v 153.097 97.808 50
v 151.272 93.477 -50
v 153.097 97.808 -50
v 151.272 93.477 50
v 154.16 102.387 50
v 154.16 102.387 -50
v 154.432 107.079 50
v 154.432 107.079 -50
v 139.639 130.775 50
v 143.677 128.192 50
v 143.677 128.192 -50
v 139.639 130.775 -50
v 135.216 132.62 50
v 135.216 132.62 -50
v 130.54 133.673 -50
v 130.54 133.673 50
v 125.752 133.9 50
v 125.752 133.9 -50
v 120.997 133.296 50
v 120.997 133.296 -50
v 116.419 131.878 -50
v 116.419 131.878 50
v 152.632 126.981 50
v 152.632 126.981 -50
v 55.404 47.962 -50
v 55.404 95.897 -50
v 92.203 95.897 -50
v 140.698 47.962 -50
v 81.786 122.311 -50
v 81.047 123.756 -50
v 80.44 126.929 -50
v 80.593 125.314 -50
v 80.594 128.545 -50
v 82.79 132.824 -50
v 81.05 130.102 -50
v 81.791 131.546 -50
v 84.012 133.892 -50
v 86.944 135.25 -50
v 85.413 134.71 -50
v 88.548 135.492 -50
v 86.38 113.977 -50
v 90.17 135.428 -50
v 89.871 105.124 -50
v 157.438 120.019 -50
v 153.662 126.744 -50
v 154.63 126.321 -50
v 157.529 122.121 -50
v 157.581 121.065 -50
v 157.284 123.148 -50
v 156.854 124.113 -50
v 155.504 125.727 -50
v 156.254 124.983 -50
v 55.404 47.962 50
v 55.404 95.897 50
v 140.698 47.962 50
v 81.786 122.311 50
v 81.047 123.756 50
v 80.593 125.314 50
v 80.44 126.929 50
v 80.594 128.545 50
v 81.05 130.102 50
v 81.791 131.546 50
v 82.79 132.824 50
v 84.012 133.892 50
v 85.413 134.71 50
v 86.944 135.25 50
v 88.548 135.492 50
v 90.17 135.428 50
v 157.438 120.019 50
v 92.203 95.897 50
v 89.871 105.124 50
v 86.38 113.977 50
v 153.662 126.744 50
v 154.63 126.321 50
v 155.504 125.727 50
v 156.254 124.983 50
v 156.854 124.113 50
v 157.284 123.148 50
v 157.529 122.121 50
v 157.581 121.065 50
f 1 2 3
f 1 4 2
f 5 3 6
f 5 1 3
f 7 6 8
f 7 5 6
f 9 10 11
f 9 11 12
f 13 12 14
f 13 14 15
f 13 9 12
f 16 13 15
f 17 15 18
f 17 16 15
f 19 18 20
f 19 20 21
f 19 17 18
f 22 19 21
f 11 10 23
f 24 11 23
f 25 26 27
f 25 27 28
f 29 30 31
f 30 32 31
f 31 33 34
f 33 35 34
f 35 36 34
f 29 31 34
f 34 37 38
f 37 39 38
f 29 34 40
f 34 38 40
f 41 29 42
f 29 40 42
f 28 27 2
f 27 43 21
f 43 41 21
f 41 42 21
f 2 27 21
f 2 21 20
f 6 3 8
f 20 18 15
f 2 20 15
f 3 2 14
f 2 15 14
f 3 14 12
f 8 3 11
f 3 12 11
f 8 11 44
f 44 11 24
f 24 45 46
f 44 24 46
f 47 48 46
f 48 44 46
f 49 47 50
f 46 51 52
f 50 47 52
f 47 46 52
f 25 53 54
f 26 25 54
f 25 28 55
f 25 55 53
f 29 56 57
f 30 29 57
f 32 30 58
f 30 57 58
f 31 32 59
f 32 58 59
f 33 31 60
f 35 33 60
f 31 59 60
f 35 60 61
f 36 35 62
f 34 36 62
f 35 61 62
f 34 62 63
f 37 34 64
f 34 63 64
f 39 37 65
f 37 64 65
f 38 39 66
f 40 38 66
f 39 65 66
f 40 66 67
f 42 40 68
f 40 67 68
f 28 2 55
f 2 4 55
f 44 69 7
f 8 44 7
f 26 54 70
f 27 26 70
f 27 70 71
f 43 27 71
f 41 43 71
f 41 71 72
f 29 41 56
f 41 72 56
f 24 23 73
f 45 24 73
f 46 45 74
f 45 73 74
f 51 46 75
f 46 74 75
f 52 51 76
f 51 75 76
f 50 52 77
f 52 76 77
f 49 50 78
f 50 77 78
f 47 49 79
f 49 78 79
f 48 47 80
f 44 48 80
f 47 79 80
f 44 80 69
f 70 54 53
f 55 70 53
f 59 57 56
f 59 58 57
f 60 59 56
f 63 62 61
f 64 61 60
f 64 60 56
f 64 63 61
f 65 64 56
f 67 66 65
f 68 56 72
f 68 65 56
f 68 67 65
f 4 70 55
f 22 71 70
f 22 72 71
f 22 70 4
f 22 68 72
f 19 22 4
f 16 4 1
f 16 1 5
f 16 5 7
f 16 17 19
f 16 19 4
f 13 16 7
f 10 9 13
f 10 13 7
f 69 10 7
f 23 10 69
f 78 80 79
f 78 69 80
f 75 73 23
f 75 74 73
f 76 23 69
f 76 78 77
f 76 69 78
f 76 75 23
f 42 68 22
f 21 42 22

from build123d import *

# Parameters (mm, degrees)
SKETCH_1_R                     = 27.60110162
EXTRUDE_1_DEPTH                = 50
SPLIT_BODIES_1_SURFACE_1_BACK  = 231.64
SPLIT_BODIES_1_SURFACE_1_DEPTH = 463.28
SPLIT_BODIES_1_SURFACE_2_BACK  = 231.64
SPLIT_BODIES_1_SURFACE_2_DEPTH = 463.28


with BuildPart() as part:
    # 草图1 → 凸台-拉伸1 (new, symmetric)
    with BuildSketch(Plane.XY):
        with Locations((126.841, 106.3205)):
            Circle(SKETCH_1_R)
        with BuildLine():
            Line((0, 29.556947787), (33.841128496, 29.556947787))
            Line((33.841128496, 29.556947787), (55.404404979, 43.133825573))
            Line((55.404404979, 43.133825573), (55.404404979, 95.897124924))
            Line((55.404404979, 95.897124924), (92.202864513, 95.897124924))
            ThreePointArc((92.202864513, 95.897124924), (88.266951773, 109.605982584), (81.786119565, 122.311217777))
            ThreePointArc((81.786119565, 122.311217777), (81.790702408, 131.54578908), (90.169806602, 135.427533672))
            Line((90.169806602, 135.427533672), (152.632483554, 126.981321854))
            ThreePointArc((152.632483554, 126.981321854), (156.573746893, 124.561834969), (157.437634447, 120.018579331))
            Line((157.437634447, 120.018579331), (140.698476255, 47.962391292))
            Line((140.698476255, 47.962391292), (125.156200351, 47.962391292))
            Line((125.156200351, 47.962391292), (116.770080258, 26.493923855))
            Line((116.770080258, 26.493923855), (133.542320443, 26.493923855))
            Line((133.542320443, 26.493923855), (144.001, 0))
            Line((144.001, 0), (0, 0))
            Line((0, 0), (0, 29.556947787))
        make_face()
    extrude(amount=EXTRUDE_1_DEPTH, both=True)


with BuildPart() as body_2:
    # Split Bodies 1: the piece behind the surface
    add(part.part)
    # Split Bodies 1 surface: a surface, the sketch's curves swept straight by 463.28 mm
    with BuildLine(Plane.XY.offset(50).offset(-SPLIT_BODIES_1_SURFACE_1_BACK), mode=Mode.PRIVATE) as split_bodies_1_surface_1_path:
        Line((125.156200351, 47.962391292), (37.921543342, 47.962391292))
    split_bodies_1_surface_1 = Shell.extrude(split_bodies_1_surface_1_path.wire(), (0 * SPLIT_BODIES_1_SURFACE_1_DEPTH, 0 * SPLIT_BODIES_1_SURFACE_1_DEPTH, 1 * SPLIT_BODIES_1_SURFACE_1_DEPTH))
    split(bisect_by=split_bodies_1_surface_1, keep=Keep.BOTTOM)


with BuildPart() as part_1:
    add(part.part)

    # Split Bodies 1: split by a surface, the side it looks to stays
    # Split Bodies 1 surface: a surface, the sketch's curves swept straight by 463.28 mm
    with BuildLine(Plane.XY.offset(50).offset(-SPLIT_BODIES_1_SURFACE_2_BACK), mode=Mode.PRIVATE) as split_bodies_1_surface_2_path:
        Line((125.156200351, 47.962391292), (37.921543342, 47.962391292))
    split_bodies_1_surface_2 = Shell.extrude(split_bodies_1_surface_2_path.wire(), (0 * SPLIT_BODIES_1_SURFACE_2_DEPTH, 0 * SPLIT_BODIES_1_SURFACE_2_DEPTH, 1 * SPLIT_BODIES_1_SURFACE_2_DEPTH))
    split(bisect_by=split_bodies_1_surface_2, keep=Keep.TOP)


solid = body_2.part
